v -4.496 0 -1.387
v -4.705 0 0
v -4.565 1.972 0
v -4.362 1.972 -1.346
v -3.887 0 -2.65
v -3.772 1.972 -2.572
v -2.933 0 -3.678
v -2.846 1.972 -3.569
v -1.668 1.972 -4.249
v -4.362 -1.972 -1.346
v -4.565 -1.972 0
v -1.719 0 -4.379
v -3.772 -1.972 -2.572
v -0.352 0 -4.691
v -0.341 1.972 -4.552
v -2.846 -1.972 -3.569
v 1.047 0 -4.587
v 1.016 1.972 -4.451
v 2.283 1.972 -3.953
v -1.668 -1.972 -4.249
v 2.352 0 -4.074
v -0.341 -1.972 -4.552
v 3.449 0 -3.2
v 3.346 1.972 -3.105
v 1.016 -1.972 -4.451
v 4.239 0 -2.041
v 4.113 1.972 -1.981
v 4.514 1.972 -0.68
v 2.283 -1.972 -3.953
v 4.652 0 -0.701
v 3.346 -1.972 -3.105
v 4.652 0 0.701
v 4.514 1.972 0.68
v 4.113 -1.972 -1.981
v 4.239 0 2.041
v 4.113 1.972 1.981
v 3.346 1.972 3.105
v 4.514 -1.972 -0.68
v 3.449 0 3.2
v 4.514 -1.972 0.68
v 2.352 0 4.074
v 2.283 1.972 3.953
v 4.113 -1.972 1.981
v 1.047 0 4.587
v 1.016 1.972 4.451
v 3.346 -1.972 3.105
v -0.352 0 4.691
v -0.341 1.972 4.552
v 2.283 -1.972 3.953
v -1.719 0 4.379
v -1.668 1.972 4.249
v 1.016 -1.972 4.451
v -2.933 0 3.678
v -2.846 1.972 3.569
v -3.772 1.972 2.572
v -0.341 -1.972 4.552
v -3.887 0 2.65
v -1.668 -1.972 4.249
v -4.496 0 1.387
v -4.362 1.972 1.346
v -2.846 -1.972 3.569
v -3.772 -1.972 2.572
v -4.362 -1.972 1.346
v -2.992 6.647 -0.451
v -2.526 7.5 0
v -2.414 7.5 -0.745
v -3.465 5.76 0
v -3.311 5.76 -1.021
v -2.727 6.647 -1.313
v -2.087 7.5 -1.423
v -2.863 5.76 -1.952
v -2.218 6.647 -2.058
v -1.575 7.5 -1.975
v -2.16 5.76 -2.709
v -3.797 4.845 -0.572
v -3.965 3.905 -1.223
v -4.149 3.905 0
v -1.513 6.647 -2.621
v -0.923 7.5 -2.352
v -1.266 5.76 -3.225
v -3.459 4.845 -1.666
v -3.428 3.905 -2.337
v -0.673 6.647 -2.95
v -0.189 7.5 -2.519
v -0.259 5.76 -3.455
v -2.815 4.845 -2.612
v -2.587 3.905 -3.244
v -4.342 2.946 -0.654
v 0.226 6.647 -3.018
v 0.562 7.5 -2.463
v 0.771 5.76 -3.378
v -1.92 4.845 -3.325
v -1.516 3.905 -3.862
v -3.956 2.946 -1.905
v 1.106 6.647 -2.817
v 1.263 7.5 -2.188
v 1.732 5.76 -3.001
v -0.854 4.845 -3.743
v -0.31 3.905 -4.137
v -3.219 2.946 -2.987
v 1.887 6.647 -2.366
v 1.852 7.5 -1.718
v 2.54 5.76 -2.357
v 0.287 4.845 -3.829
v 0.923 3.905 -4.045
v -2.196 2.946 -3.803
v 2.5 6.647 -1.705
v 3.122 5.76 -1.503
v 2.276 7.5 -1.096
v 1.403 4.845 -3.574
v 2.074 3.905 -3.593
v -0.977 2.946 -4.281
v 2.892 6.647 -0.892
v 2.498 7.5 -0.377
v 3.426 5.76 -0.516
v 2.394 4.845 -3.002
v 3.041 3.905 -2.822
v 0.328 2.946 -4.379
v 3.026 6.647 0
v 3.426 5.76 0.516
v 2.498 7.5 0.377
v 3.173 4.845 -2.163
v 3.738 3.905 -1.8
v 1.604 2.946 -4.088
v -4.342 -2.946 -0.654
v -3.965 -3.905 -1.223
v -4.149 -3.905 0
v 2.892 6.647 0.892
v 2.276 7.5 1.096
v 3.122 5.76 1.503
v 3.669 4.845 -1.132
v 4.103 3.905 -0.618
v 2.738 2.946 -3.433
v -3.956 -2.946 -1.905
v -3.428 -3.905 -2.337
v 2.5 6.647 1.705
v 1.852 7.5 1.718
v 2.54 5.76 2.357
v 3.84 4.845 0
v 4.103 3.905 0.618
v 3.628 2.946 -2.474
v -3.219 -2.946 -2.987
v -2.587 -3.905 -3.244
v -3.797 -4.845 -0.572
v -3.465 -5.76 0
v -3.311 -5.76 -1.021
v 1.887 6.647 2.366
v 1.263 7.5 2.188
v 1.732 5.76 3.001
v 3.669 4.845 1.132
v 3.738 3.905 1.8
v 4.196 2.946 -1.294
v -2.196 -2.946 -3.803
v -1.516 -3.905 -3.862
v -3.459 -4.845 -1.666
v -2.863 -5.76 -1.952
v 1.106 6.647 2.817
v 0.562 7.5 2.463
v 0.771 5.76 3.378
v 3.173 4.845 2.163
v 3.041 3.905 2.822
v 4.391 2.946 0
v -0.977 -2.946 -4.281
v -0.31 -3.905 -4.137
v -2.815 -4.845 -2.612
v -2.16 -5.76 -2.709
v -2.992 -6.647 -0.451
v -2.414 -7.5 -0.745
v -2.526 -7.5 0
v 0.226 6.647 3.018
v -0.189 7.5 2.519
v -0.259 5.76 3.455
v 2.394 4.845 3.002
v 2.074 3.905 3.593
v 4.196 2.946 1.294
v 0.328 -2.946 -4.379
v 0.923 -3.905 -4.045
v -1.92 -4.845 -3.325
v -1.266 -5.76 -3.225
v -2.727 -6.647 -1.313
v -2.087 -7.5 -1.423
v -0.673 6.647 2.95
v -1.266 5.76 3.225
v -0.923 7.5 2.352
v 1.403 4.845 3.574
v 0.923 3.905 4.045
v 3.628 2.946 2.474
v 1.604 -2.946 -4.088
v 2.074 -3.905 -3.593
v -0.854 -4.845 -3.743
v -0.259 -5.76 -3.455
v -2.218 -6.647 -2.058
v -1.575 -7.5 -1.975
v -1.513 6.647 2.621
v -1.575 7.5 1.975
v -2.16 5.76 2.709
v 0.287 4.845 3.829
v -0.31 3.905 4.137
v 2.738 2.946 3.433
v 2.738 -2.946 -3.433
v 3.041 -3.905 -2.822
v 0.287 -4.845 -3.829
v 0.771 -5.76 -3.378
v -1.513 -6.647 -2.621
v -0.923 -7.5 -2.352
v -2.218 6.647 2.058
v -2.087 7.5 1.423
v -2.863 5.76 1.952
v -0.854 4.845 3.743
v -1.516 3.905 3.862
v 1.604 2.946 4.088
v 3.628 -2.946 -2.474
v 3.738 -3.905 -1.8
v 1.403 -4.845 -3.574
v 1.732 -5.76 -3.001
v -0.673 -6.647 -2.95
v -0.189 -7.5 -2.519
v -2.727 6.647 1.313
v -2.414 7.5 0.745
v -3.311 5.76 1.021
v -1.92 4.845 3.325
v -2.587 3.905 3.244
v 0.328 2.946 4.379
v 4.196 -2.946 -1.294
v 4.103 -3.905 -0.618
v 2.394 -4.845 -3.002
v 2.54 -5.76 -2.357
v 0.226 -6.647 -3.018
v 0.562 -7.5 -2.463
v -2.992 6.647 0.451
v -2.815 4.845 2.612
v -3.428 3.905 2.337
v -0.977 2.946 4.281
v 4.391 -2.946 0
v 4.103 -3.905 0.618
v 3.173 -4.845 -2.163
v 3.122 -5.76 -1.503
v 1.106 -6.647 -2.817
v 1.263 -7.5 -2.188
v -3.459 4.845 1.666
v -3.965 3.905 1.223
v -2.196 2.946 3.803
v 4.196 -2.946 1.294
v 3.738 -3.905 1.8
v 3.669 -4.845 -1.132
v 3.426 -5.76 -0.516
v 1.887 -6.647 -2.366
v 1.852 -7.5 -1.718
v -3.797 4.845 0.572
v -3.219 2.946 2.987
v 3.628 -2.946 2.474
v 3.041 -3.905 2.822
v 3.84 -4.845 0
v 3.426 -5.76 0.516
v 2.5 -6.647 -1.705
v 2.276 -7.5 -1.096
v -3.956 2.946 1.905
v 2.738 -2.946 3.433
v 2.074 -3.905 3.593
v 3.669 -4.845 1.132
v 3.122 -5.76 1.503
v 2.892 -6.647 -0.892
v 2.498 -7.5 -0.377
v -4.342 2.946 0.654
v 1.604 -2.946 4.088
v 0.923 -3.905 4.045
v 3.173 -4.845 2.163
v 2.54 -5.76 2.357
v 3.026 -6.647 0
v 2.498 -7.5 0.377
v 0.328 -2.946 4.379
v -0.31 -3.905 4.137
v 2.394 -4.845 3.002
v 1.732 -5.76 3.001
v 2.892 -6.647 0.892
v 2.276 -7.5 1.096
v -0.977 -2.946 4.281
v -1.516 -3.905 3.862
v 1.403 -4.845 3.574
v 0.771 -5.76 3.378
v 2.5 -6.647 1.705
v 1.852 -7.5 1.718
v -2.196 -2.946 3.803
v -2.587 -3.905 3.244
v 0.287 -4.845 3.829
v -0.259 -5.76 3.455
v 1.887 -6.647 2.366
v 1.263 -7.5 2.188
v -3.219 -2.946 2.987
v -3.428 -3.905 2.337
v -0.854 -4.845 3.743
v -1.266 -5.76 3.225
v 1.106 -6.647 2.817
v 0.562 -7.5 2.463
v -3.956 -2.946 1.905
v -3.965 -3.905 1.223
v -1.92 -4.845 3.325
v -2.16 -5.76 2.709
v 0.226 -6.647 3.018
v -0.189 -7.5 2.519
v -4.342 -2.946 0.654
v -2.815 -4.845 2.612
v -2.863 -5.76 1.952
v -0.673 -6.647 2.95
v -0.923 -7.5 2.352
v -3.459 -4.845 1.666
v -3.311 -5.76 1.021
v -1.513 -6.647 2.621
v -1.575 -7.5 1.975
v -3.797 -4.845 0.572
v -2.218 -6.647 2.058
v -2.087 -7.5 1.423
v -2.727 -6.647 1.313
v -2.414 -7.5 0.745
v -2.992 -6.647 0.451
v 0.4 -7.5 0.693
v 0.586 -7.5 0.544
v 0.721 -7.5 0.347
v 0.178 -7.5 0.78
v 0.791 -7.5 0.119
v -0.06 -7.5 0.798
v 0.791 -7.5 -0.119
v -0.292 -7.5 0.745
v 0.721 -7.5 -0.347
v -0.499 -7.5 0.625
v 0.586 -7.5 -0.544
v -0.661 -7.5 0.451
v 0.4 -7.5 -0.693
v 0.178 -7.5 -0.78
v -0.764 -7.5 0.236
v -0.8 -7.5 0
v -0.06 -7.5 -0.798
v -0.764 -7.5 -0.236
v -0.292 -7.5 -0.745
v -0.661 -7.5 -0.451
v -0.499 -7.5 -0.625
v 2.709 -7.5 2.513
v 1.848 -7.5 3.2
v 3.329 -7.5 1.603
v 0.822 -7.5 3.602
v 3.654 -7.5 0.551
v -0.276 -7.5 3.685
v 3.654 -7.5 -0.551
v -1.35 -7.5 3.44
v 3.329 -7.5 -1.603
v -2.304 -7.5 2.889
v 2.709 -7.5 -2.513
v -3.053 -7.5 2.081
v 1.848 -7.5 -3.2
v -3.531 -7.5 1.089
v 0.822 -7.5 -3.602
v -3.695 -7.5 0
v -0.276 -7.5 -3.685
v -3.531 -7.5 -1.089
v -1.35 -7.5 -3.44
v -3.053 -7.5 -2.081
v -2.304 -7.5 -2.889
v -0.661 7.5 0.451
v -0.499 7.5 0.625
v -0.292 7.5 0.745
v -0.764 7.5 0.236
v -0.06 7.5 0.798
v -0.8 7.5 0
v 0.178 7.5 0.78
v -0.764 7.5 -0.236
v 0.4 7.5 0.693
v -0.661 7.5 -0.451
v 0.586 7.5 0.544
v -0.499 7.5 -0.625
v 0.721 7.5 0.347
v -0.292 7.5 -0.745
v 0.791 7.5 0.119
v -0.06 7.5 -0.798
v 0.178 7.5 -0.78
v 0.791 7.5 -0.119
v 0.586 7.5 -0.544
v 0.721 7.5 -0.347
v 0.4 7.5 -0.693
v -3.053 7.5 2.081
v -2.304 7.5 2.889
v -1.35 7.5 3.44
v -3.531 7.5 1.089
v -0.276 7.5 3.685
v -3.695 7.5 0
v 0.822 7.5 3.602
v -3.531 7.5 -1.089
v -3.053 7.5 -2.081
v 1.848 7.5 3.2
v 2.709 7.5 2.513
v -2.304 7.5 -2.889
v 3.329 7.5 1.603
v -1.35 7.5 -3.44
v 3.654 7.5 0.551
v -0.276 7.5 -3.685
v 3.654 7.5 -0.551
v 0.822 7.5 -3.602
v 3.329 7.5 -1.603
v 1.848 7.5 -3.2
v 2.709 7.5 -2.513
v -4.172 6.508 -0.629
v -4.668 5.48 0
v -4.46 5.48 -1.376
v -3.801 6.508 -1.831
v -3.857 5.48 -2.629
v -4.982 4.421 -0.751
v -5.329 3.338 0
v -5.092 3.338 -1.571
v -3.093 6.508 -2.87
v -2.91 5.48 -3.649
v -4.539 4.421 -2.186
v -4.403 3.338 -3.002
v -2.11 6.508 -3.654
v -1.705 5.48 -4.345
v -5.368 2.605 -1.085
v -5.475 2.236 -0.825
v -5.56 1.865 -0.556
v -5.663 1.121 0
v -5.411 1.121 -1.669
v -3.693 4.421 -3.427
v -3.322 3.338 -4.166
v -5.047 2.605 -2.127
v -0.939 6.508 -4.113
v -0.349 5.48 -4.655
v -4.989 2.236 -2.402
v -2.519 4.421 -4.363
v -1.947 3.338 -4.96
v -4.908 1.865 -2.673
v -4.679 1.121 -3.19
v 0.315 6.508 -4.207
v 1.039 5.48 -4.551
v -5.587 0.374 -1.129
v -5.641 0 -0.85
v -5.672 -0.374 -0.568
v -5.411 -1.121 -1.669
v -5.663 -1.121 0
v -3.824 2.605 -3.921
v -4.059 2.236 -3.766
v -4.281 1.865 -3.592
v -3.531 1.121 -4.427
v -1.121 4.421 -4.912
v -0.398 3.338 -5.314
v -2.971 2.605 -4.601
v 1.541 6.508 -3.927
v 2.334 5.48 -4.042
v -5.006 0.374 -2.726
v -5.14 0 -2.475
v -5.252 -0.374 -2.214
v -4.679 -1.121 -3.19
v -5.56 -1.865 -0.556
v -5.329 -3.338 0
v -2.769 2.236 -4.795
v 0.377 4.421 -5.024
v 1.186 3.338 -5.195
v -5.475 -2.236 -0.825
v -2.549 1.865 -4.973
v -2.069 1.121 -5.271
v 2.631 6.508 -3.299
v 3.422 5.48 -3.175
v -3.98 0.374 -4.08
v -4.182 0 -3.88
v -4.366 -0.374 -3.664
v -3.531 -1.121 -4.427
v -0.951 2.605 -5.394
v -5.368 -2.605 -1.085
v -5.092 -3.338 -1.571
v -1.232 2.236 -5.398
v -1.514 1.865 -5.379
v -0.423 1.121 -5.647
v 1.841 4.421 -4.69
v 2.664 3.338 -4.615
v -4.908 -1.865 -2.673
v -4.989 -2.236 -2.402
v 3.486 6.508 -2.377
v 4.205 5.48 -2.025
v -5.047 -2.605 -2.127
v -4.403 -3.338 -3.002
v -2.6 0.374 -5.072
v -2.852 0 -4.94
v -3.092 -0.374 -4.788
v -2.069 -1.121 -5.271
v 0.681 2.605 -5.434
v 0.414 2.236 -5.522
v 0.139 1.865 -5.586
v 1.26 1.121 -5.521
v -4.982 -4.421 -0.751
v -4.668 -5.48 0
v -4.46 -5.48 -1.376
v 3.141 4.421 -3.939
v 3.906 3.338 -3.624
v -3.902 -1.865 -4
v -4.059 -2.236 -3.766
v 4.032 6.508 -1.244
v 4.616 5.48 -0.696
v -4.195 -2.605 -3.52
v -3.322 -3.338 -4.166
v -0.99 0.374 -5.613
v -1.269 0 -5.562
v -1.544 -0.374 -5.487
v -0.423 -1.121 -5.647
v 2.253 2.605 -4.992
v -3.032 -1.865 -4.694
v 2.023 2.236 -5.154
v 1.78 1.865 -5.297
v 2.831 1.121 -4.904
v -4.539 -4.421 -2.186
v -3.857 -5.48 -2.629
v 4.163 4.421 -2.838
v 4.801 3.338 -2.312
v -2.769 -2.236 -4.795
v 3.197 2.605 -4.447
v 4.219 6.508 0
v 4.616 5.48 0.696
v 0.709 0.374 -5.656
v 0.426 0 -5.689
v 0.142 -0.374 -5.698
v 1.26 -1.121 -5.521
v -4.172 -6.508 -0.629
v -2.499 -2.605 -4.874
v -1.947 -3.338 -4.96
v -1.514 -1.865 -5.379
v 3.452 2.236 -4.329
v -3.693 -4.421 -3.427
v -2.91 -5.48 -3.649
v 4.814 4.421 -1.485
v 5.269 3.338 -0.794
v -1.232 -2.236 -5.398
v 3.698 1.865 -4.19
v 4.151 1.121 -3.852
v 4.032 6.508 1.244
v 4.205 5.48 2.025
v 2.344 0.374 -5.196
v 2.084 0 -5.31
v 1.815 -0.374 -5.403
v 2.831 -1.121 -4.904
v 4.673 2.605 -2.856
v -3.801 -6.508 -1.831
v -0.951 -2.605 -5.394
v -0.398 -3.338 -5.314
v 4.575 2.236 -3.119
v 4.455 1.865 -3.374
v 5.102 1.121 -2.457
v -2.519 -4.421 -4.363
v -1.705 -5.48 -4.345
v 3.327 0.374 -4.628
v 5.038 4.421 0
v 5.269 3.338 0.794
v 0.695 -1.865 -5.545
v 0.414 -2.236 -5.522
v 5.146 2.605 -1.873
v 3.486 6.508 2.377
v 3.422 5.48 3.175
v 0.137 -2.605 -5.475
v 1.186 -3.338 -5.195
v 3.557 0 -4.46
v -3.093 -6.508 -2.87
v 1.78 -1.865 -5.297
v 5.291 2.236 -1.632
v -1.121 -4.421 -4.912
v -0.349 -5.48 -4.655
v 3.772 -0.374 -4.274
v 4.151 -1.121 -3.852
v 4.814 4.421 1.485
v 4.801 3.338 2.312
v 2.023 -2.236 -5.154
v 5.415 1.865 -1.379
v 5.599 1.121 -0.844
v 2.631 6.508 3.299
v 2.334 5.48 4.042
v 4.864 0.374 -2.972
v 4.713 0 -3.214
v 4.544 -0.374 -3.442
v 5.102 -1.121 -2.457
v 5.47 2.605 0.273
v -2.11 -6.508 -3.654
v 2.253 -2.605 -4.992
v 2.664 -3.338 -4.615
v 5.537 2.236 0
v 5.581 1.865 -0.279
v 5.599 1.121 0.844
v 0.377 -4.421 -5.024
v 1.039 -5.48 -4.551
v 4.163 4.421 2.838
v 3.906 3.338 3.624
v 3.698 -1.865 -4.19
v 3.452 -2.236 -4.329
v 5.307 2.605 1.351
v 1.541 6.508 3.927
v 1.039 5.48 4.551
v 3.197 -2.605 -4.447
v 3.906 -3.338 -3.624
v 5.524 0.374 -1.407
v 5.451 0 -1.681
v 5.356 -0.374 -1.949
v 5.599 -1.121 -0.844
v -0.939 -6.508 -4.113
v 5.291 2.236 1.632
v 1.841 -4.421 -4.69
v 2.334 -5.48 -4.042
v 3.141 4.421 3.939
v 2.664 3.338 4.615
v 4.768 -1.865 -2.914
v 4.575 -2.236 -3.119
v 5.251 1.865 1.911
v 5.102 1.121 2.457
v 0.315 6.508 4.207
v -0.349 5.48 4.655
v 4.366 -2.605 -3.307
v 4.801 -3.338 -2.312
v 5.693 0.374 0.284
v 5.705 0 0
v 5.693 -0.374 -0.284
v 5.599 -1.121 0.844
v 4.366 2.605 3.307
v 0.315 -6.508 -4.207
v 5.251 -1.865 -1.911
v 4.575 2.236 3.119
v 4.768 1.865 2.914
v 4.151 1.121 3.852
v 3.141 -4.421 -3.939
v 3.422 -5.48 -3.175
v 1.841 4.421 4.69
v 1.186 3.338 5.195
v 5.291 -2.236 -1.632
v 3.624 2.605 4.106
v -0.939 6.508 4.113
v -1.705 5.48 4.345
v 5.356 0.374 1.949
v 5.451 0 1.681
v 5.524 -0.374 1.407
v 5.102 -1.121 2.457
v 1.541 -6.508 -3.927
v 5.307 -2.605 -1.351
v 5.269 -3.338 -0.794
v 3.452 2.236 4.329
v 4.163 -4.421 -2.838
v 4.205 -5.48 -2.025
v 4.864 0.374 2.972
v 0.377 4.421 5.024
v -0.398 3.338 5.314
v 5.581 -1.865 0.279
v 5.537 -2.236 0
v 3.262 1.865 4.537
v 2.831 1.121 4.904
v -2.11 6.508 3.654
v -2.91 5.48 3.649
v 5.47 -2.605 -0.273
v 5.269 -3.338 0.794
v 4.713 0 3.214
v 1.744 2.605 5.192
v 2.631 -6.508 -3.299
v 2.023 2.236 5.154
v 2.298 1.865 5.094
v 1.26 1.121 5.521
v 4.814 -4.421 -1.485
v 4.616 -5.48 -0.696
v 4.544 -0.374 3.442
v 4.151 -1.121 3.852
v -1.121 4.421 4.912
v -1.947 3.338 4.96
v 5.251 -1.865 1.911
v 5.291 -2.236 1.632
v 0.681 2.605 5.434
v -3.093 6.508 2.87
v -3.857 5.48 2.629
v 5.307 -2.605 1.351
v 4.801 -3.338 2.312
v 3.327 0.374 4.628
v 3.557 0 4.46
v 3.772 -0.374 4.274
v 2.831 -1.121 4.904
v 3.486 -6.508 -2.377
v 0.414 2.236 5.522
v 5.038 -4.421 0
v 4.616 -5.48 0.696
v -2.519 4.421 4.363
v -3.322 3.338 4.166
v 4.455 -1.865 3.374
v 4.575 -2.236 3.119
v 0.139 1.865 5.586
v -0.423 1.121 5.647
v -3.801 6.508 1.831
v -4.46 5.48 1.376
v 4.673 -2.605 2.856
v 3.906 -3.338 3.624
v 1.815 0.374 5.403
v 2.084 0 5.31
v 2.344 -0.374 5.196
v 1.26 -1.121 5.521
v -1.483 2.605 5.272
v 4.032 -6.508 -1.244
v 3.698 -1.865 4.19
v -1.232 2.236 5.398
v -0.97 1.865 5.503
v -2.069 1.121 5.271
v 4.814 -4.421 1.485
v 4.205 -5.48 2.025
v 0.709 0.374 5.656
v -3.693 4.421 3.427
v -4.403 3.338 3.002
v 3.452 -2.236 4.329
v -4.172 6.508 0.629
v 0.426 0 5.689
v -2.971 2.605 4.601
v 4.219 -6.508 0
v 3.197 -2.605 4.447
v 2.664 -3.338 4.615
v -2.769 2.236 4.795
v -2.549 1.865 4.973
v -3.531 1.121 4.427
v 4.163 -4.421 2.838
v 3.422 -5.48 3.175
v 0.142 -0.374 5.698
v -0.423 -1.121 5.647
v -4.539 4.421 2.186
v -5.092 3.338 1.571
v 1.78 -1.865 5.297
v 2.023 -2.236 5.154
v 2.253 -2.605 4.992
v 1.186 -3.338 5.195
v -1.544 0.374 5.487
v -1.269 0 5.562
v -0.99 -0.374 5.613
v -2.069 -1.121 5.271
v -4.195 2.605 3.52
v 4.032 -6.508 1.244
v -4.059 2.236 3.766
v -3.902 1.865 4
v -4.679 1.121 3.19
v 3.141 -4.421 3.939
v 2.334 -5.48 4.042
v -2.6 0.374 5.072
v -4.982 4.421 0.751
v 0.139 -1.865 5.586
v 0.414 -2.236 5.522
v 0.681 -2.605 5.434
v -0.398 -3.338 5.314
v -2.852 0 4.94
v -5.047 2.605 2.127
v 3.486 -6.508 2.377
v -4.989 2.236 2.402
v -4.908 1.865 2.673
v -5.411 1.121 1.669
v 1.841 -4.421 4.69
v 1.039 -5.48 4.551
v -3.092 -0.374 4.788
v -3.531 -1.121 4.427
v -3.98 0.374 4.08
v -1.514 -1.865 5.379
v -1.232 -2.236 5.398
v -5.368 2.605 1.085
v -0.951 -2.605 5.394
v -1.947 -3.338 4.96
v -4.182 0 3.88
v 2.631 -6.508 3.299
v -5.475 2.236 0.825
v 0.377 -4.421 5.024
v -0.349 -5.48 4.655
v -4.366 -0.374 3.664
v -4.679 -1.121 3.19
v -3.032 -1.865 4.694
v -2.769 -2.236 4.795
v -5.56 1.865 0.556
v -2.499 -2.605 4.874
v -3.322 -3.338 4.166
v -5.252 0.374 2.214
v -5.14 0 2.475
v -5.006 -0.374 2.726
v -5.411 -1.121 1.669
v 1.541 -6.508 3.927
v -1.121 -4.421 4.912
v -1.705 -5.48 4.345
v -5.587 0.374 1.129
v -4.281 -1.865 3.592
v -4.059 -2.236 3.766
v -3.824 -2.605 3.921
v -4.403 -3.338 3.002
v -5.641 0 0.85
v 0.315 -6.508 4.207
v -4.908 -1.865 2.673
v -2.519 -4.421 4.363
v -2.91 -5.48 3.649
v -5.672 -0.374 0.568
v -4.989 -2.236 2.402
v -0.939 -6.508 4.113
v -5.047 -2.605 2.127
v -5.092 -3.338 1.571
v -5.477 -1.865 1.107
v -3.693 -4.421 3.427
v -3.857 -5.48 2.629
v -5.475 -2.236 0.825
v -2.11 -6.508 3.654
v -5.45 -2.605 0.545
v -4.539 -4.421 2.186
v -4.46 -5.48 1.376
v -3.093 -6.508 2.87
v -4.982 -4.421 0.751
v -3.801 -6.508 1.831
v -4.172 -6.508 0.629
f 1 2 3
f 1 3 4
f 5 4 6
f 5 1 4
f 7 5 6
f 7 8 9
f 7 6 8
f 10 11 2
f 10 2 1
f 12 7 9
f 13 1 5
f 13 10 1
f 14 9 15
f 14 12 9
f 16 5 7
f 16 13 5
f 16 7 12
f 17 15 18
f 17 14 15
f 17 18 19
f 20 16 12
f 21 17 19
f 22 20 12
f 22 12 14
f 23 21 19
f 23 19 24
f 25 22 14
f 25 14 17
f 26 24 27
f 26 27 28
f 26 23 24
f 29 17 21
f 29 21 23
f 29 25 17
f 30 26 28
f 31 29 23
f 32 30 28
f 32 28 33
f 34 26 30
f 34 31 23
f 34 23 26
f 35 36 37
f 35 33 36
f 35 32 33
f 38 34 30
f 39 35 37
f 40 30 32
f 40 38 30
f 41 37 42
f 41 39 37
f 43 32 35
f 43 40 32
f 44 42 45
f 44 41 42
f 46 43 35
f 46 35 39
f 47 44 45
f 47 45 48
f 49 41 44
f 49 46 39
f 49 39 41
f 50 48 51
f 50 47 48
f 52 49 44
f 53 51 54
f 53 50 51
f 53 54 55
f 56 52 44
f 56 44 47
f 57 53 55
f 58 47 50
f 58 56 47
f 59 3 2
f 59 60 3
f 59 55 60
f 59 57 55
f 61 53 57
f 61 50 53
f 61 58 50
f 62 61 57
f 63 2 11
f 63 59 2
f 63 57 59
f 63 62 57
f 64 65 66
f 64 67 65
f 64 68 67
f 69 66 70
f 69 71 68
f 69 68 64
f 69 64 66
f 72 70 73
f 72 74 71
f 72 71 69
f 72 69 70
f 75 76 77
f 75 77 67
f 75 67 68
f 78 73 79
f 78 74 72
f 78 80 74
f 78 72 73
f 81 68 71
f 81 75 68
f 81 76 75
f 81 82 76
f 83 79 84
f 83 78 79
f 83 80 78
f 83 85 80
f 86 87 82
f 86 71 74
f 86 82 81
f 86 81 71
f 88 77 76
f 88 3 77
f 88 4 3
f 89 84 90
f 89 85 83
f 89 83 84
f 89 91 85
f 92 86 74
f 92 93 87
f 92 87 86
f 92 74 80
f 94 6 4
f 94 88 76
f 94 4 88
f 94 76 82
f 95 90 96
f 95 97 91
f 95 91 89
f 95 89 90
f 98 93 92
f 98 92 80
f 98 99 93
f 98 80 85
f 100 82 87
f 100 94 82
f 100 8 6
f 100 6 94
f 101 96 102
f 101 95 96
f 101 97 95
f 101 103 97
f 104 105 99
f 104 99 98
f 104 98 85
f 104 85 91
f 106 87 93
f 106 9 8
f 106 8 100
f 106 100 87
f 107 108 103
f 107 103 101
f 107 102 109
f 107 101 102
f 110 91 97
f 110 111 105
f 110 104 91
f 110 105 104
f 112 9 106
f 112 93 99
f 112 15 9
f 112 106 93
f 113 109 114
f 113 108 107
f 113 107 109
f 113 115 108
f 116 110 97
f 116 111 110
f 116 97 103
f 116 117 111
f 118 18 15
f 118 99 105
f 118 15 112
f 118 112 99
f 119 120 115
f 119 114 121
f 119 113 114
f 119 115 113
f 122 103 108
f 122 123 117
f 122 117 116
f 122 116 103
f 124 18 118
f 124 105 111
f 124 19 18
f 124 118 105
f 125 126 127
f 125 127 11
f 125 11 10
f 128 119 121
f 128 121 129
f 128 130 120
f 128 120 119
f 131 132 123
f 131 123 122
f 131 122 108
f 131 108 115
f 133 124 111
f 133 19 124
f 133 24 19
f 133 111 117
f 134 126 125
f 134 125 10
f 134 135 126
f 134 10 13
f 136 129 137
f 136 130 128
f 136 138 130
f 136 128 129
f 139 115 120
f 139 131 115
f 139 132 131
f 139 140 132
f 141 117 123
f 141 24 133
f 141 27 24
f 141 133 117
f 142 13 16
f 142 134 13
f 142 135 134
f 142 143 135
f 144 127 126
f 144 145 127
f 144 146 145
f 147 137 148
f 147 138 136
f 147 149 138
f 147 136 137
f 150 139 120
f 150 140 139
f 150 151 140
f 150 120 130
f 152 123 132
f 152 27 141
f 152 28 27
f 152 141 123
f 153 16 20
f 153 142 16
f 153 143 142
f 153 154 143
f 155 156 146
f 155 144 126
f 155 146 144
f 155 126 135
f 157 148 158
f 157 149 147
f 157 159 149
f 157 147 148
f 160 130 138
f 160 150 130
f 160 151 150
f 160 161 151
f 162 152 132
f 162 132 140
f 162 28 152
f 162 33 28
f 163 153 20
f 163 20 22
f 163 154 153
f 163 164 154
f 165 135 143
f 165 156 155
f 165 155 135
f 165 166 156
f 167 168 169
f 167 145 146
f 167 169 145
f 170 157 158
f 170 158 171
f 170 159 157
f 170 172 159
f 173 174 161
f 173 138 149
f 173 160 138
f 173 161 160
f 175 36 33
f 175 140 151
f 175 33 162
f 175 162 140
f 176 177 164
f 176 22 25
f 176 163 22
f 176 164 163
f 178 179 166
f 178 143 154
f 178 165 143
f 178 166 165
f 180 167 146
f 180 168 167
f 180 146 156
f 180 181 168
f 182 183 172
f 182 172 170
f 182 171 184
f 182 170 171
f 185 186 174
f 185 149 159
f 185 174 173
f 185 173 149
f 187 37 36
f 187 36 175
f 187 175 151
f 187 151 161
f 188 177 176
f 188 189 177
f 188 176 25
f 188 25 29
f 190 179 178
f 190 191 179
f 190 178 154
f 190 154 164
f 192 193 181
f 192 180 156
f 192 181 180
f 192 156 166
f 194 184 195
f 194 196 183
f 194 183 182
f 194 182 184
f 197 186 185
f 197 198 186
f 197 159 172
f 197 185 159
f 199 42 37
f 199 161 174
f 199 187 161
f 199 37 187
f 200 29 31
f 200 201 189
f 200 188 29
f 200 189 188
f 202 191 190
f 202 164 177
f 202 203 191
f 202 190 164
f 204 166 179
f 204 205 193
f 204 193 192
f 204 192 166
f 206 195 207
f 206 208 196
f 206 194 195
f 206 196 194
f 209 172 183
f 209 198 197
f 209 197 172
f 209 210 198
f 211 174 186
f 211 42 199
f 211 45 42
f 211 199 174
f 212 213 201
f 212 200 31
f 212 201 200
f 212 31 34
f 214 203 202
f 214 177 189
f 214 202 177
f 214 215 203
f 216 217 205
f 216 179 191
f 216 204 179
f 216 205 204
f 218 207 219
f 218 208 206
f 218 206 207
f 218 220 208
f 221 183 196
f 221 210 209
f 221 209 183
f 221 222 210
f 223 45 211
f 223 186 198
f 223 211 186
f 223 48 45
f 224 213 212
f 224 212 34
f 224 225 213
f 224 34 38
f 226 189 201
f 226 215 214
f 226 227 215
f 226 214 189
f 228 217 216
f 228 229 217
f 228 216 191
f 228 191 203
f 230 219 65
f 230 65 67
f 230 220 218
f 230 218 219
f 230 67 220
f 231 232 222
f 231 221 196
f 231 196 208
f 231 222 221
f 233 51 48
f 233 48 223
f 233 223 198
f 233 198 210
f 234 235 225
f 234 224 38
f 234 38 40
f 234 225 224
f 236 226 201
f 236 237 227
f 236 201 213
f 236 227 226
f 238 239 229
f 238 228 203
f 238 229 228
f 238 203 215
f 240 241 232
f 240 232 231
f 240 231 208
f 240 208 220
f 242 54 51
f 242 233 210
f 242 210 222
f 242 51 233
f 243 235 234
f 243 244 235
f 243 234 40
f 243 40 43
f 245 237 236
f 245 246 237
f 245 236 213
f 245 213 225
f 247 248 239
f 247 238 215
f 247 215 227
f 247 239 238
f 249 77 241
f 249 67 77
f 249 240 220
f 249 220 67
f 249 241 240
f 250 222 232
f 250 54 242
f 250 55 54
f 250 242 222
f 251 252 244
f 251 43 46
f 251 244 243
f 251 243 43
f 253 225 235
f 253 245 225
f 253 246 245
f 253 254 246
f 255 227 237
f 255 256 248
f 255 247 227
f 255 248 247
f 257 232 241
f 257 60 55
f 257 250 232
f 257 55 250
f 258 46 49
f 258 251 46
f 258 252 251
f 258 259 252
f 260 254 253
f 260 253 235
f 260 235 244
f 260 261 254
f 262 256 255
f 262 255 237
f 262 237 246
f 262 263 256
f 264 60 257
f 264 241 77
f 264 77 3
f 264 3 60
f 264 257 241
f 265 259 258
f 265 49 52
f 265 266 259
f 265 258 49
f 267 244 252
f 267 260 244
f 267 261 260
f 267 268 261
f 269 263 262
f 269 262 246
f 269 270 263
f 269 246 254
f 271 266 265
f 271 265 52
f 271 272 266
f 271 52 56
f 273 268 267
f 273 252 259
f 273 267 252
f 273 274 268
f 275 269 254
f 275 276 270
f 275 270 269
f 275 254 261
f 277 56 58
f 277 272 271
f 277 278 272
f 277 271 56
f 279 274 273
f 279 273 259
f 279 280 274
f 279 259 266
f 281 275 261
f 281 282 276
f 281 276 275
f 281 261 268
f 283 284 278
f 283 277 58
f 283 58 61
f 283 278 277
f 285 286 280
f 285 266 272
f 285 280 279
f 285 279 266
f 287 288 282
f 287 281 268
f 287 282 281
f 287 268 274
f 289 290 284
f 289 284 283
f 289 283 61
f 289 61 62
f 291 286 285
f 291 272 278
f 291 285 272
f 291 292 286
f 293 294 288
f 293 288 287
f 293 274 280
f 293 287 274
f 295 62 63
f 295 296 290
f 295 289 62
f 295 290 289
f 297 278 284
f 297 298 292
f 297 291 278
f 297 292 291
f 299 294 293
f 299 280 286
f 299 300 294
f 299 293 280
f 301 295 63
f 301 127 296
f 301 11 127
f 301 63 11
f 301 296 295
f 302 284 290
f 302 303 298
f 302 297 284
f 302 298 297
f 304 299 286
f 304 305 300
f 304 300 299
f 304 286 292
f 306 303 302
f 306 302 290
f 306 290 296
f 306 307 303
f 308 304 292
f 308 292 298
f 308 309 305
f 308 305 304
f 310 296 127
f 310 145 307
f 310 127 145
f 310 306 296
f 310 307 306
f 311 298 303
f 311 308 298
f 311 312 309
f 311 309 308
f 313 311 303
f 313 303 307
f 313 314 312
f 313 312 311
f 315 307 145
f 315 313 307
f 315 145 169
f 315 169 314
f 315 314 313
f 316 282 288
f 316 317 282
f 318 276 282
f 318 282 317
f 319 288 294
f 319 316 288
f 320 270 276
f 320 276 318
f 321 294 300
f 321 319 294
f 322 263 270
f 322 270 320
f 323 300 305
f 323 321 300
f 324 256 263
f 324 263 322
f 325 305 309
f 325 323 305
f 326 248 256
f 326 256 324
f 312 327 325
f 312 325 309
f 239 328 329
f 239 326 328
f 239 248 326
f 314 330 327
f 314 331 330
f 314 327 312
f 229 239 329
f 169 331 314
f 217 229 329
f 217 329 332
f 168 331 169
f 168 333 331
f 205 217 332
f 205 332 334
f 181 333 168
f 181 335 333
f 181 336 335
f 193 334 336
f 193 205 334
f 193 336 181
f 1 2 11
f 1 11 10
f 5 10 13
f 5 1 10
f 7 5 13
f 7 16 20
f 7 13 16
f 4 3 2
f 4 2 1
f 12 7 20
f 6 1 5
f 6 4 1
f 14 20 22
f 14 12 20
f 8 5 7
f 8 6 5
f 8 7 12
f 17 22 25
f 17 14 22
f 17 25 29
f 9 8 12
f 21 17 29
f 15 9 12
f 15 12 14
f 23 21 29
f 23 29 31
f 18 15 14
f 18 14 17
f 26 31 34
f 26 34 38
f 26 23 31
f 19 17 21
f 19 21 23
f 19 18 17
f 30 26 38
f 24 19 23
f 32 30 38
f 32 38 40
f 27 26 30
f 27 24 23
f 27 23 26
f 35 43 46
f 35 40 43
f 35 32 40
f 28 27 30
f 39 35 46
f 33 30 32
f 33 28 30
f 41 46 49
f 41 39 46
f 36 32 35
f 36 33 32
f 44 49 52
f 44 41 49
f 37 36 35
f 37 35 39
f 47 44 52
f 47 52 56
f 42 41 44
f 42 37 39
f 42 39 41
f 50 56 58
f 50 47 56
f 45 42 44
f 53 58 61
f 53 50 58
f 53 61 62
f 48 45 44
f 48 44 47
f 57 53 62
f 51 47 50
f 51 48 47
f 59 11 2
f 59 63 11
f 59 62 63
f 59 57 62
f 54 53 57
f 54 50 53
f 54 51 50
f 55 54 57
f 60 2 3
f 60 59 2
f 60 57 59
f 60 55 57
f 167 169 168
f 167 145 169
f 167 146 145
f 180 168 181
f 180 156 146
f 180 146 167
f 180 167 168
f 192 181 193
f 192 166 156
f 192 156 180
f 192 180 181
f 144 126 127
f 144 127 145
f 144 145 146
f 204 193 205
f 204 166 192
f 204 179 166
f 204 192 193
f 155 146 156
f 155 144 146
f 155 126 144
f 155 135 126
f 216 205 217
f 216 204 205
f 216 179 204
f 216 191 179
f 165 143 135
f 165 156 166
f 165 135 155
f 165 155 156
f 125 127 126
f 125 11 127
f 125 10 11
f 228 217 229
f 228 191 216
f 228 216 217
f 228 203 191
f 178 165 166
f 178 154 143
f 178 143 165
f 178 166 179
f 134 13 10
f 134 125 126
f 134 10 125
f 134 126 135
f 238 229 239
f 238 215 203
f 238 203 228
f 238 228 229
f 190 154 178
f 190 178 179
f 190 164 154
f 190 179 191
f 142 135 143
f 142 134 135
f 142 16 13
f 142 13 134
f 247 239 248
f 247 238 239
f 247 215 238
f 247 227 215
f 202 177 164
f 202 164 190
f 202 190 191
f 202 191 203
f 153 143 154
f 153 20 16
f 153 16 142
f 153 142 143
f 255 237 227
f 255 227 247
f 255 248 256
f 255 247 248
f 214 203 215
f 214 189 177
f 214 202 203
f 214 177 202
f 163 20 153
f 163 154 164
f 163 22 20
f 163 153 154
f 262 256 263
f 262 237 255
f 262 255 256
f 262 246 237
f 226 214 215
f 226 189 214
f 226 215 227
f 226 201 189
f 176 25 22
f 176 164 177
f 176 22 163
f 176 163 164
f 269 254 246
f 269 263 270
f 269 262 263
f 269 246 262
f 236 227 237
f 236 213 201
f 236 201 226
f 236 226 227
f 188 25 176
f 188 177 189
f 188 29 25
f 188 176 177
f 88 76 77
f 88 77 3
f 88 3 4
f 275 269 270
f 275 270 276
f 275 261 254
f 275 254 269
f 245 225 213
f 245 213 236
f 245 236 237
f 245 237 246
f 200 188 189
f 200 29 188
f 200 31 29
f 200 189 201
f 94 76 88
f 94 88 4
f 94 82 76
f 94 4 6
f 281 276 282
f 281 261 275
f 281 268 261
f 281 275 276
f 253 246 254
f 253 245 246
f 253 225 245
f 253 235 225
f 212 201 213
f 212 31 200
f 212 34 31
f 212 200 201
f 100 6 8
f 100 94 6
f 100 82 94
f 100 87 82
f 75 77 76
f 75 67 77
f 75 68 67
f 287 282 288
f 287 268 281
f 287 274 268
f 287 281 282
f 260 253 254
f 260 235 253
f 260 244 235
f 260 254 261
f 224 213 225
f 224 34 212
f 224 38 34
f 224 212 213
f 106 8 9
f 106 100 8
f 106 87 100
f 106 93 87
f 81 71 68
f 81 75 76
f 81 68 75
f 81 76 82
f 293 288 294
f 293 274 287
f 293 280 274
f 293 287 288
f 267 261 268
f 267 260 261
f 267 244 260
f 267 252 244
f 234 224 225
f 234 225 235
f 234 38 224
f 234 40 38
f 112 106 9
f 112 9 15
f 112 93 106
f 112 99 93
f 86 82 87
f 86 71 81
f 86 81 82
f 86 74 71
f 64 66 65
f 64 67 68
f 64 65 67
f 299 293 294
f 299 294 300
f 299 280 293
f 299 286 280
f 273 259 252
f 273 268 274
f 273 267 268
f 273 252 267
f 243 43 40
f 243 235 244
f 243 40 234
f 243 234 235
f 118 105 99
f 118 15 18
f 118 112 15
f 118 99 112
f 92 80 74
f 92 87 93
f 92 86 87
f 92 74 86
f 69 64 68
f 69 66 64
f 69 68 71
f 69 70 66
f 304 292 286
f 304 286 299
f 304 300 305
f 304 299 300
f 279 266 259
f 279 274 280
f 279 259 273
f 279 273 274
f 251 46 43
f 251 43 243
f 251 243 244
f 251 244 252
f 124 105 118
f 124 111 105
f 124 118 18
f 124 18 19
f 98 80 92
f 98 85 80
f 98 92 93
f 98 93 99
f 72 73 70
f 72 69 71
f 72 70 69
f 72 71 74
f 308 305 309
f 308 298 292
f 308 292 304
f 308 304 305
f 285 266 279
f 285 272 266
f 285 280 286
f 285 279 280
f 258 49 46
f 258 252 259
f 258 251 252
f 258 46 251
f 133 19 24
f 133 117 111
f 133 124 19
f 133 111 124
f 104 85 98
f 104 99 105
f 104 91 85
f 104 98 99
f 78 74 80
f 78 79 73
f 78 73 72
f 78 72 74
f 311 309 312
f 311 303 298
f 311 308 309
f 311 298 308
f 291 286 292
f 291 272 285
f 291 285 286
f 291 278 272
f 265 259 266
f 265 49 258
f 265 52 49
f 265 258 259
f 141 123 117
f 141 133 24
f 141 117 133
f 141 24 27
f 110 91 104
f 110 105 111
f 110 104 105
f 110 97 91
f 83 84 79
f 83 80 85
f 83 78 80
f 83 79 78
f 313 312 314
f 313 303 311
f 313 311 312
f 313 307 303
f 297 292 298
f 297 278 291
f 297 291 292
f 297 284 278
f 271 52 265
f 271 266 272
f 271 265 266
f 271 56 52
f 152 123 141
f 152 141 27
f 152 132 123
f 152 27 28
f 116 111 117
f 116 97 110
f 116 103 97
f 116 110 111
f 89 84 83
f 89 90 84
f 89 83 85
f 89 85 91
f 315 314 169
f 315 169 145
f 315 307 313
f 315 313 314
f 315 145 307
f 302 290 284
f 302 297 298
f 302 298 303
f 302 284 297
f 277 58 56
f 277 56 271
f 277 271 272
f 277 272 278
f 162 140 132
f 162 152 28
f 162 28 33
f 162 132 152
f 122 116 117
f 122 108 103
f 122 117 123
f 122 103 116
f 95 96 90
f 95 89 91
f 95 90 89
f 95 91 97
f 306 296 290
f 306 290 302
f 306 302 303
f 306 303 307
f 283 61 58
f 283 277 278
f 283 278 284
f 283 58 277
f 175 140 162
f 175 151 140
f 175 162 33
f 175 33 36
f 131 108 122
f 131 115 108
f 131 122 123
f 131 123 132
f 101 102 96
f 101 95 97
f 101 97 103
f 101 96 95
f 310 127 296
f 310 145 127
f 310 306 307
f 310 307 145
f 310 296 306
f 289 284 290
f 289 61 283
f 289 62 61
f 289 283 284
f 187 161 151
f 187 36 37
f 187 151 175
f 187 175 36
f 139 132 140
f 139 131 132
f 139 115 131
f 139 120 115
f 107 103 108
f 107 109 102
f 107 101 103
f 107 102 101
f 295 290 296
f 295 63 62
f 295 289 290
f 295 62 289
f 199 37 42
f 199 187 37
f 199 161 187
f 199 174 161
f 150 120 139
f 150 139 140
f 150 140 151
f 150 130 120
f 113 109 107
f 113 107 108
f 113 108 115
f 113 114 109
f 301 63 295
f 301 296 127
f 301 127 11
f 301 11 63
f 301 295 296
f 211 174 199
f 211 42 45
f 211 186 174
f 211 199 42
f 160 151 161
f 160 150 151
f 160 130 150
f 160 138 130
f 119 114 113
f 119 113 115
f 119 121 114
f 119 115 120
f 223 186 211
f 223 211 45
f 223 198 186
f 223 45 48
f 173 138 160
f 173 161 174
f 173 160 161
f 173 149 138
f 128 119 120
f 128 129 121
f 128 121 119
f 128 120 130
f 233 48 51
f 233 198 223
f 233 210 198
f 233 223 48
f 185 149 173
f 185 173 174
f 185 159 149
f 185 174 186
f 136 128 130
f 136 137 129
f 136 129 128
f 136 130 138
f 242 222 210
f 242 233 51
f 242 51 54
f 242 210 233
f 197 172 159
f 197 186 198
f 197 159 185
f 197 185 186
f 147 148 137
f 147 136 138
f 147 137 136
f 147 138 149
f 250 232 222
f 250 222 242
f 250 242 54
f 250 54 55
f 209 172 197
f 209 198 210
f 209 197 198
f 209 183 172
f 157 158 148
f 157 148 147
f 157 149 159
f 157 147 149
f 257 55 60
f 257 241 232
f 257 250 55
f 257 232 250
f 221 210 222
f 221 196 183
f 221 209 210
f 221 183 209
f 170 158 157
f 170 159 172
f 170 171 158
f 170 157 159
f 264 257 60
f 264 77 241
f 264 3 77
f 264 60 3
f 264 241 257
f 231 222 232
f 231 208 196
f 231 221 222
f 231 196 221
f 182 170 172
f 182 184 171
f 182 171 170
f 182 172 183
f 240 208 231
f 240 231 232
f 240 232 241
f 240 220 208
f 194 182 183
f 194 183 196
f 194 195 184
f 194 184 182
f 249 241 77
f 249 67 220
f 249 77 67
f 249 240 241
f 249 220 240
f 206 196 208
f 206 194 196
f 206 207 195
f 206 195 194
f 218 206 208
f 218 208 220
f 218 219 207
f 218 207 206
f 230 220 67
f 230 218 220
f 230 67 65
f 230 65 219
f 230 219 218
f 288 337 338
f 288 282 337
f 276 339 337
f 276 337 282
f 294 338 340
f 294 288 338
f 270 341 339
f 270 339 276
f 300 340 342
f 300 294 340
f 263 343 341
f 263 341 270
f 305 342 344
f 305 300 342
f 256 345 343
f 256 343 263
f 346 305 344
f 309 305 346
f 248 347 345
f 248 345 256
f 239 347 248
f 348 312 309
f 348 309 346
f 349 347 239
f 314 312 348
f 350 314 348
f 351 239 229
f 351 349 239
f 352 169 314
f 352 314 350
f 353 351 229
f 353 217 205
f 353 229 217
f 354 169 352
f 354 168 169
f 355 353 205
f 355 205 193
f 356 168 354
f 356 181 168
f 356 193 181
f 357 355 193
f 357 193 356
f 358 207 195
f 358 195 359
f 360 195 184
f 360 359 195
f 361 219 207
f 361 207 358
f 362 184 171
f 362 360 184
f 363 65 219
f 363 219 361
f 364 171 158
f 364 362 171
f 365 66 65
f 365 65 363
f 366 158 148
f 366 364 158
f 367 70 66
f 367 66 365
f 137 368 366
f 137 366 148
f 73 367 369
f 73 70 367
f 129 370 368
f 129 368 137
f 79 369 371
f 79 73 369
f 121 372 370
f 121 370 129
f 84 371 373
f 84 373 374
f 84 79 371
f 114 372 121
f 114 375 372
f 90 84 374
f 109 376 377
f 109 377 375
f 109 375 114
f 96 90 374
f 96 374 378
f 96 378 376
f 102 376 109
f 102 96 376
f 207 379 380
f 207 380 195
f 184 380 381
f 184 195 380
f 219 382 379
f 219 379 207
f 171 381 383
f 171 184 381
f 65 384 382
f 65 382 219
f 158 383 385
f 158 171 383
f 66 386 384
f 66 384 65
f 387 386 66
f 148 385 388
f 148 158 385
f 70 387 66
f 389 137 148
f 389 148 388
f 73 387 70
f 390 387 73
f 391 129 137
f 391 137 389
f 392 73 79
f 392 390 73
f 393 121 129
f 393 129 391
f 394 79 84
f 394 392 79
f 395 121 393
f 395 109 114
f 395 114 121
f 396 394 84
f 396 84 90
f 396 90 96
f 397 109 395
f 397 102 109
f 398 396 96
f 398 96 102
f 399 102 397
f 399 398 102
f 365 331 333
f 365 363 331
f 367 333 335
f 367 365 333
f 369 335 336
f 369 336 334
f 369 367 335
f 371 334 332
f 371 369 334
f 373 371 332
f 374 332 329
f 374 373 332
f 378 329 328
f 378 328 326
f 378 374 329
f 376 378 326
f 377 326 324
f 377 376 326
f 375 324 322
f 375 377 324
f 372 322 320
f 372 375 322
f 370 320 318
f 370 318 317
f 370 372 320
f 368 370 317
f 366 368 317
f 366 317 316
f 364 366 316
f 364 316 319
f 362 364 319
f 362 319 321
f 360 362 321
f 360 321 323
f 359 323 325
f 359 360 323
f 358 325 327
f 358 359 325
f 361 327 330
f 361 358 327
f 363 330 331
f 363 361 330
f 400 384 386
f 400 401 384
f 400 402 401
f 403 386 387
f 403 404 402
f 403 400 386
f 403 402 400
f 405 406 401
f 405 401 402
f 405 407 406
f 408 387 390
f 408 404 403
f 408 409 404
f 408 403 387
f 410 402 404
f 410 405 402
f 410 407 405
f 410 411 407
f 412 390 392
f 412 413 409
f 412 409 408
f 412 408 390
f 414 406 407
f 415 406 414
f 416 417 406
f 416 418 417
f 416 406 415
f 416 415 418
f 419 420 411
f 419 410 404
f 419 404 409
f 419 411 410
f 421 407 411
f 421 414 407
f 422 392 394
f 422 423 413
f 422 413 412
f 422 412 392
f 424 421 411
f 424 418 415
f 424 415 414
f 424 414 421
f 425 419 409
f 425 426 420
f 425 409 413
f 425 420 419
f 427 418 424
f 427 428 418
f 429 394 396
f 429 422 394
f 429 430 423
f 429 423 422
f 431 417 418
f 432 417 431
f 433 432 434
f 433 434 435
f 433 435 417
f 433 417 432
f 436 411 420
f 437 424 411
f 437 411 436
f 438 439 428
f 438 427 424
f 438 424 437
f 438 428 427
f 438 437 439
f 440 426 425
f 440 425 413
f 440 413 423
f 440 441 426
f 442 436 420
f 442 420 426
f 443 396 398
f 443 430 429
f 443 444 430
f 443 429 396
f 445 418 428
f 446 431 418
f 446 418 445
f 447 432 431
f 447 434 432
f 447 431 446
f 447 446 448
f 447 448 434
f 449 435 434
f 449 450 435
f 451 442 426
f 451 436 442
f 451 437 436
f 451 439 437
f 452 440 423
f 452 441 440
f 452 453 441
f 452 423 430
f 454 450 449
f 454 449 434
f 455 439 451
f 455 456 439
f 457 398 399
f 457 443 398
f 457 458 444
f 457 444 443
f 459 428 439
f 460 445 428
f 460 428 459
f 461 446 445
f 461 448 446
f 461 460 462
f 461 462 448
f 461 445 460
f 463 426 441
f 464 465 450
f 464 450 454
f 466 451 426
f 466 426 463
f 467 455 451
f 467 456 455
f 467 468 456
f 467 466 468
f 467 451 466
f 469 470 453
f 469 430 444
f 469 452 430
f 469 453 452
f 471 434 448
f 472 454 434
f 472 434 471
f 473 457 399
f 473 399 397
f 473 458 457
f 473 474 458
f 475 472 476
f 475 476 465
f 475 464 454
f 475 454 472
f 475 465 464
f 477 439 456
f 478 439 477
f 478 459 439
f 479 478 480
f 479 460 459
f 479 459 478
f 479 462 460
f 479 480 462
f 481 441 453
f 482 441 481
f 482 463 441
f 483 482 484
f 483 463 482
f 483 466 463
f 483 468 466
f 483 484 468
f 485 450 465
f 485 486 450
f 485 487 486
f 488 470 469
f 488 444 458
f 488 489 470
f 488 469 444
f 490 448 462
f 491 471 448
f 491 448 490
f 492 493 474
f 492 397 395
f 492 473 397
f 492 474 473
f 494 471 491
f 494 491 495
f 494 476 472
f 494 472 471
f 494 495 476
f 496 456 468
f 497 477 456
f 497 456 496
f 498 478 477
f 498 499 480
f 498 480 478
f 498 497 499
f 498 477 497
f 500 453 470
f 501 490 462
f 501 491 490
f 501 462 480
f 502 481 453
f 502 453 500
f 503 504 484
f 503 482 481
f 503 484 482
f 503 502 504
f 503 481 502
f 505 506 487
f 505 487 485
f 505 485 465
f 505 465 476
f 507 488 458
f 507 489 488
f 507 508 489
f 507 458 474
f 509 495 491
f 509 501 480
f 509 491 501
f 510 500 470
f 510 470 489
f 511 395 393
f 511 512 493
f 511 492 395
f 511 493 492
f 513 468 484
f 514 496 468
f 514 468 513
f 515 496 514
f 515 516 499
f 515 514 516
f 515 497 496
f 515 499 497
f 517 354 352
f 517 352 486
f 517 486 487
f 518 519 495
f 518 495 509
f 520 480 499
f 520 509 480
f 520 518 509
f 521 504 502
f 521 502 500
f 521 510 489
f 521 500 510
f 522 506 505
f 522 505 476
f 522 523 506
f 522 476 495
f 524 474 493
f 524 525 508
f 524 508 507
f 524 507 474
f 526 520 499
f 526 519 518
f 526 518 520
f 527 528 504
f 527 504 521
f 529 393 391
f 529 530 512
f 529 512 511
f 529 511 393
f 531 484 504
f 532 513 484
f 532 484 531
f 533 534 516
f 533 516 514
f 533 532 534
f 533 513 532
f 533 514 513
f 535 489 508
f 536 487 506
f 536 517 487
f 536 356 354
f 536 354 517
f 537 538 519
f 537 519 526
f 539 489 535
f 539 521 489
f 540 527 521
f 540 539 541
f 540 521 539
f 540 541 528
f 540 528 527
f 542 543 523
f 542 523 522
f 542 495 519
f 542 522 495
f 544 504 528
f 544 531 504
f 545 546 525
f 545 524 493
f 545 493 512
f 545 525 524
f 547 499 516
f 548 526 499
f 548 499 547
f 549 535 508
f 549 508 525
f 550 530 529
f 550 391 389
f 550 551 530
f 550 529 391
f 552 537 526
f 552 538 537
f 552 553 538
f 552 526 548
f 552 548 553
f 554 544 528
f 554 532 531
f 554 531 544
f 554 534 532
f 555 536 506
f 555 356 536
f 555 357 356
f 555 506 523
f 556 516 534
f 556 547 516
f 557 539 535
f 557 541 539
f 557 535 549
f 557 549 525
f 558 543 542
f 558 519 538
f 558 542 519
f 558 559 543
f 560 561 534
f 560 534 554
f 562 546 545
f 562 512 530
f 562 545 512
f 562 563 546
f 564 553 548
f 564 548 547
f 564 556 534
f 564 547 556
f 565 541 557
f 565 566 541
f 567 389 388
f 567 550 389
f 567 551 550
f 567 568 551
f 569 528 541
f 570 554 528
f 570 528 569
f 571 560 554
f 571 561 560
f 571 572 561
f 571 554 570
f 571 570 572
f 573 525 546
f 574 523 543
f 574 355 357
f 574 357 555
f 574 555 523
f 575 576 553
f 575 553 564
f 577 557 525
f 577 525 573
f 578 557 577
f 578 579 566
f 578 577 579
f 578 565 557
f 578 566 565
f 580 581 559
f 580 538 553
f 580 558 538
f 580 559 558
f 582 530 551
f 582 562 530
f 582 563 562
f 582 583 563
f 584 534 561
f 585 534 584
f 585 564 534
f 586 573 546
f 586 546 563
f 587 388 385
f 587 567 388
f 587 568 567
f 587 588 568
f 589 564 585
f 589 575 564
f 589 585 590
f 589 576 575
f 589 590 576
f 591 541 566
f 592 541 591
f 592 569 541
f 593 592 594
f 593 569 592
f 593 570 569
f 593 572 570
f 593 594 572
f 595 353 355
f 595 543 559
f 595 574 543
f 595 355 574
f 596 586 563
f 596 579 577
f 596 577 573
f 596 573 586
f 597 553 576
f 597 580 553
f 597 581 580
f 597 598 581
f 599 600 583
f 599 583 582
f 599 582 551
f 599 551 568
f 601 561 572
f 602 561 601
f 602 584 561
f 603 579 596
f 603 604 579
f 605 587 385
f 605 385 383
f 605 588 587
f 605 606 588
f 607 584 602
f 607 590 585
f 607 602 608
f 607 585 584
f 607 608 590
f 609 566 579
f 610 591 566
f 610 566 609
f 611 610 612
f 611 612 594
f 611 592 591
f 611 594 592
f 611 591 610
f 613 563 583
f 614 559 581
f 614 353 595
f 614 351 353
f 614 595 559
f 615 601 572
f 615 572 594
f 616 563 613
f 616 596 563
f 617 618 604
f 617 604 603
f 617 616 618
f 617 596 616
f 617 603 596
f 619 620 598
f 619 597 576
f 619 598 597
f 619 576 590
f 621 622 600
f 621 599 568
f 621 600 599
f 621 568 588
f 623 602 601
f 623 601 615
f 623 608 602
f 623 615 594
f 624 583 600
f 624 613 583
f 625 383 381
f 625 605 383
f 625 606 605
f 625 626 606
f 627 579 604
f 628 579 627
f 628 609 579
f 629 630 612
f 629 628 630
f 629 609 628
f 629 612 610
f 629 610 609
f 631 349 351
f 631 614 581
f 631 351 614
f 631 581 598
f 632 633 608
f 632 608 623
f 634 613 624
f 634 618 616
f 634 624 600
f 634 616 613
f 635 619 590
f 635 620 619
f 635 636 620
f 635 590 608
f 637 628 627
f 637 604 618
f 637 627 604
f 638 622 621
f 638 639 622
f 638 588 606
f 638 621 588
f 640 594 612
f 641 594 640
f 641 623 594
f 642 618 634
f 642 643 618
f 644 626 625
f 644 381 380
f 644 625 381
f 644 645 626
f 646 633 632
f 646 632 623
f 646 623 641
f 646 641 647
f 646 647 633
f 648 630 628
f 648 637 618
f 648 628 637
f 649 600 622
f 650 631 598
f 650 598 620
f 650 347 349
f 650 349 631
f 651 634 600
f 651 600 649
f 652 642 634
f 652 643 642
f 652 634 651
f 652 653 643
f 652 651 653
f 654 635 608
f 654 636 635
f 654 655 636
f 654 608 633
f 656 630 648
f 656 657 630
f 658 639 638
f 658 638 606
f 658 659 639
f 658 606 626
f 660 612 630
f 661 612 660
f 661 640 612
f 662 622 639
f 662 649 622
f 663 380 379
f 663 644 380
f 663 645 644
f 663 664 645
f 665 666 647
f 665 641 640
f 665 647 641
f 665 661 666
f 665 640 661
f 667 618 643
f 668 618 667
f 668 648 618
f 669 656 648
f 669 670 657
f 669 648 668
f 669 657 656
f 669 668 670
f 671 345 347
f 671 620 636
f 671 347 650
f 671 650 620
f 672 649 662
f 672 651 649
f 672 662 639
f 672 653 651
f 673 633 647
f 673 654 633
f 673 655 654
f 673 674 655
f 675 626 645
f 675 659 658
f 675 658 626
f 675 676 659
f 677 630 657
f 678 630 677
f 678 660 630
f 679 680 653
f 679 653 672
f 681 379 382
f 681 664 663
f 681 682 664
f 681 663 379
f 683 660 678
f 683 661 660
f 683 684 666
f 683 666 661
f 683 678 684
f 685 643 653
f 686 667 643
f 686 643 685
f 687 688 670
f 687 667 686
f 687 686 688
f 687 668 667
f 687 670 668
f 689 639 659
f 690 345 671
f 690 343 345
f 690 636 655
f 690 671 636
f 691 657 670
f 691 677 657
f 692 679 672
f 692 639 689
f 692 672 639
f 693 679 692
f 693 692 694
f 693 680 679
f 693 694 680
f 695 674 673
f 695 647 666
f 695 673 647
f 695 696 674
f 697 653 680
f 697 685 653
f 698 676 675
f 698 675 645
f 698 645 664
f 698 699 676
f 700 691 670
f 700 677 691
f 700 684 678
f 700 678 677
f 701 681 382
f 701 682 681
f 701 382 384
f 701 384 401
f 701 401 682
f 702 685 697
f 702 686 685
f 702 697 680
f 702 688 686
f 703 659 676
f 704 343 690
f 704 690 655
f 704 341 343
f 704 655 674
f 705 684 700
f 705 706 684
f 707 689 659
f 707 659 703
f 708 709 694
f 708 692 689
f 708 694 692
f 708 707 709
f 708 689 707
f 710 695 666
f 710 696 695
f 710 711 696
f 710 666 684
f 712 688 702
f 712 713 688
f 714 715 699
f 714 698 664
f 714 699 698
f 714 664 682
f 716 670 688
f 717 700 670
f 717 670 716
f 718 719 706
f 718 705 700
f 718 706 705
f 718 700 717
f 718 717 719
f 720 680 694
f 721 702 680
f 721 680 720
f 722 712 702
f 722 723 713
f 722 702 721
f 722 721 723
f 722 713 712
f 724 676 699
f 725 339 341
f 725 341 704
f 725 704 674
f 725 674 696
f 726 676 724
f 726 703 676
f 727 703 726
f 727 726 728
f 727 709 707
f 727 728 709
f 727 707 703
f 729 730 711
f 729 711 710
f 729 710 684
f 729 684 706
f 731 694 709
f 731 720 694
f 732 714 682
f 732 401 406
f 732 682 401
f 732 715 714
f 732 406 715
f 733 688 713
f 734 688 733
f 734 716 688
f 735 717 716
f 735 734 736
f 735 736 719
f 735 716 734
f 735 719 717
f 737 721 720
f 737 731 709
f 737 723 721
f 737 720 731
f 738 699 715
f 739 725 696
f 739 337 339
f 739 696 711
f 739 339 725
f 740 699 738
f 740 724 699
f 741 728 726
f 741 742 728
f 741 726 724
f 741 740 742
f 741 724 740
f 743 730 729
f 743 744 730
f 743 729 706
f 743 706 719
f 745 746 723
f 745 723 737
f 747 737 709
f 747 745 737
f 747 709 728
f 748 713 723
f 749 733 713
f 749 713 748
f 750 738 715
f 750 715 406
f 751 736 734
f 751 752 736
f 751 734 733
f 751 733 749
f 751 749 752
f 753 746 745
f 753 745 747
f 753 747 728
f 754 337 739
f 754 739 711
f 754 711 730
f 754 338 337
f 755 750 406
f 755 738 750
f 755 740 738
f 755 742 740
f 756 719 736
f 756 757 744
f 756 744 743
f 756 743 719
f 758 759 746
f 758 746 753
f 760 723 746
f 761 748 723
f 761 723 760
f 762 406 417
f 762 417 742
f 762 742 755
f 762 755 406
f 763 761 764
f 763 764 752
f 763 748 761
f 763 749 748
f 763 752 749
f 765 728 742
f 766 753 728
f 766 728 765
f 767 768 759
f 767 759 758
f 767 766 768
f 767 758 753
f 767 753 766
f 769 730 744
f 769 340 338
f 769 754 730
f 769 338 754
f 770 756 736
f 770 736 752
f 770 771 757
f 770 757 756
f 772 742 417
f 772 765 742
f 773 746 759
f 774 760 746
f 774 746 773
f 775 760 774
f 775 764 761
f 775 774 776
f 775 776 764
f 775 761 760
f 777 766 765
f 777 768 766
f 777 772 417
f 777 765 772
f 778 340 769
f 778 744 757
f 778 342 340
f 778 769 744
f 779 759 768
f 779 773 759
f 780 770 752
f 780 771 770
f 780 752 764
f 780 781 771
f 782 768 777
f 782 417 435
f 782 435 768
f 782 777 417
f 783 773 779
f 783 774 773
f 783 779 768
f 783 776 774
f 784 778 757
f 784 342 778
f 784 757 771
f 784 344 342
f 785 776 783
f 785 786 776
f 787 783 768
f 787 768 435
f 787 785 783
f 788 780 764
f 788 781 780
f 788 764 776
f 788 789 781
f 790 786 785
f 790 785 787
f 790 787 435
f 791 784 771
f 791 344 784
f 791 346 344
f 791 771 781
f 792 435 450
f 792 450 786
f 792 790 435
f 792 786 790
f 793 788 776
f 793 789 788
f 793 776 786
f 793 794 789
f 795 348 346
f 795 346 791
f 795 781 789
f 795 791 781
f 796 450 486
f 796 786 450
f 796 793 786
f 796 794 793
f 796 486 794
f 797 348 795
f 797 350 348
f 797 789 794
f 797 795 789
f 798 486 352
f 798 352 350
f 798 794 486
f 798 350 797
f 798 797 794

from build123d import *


with BuildPart() as part:
    # Sketch1 → Interior (revolve)
    with BuildSketch(Plane.XY):
        with BuildLine():
            Line((-2.526209361, -7.5), (-0.8, -7.5))
            Line((-0.8, -7.5), (-0.8, 7.5))
            Line((-0.8, 7.5), (-2.526209361, 7.5))
            ThreePointArc((-2.526209361, 7.5), (-4.704618943, 0), (-2.526209361, -7.5))
        make_face()
    revolve(axis=Axis((0, 7.5, 0), (0, -1, 0)))


with BuildPart() as body_2:
    # Sketch1<3> → Exterior (revolve)
    with BuildSketch(Plane.XY):
        with BuildLine():
            Line((-3.695, -7.5), (-2.526209361, -7.5))
            ThreePointArc((-2.526209361, -7.5), (-4.704618943, 0), (-2.526209361, 7.5))
            Line((-2.526209361, 7.5), (-3.695, 7.5))
            ThreePointArc((-3.695, 7.5), (-5.704618943, 0), (-3.695, -7.5))
        make_face()
    revolve(axis=Axis((0, 7.5, 0), (0, -1, 0)))


solid = Compound([part.part, body_2.part])
